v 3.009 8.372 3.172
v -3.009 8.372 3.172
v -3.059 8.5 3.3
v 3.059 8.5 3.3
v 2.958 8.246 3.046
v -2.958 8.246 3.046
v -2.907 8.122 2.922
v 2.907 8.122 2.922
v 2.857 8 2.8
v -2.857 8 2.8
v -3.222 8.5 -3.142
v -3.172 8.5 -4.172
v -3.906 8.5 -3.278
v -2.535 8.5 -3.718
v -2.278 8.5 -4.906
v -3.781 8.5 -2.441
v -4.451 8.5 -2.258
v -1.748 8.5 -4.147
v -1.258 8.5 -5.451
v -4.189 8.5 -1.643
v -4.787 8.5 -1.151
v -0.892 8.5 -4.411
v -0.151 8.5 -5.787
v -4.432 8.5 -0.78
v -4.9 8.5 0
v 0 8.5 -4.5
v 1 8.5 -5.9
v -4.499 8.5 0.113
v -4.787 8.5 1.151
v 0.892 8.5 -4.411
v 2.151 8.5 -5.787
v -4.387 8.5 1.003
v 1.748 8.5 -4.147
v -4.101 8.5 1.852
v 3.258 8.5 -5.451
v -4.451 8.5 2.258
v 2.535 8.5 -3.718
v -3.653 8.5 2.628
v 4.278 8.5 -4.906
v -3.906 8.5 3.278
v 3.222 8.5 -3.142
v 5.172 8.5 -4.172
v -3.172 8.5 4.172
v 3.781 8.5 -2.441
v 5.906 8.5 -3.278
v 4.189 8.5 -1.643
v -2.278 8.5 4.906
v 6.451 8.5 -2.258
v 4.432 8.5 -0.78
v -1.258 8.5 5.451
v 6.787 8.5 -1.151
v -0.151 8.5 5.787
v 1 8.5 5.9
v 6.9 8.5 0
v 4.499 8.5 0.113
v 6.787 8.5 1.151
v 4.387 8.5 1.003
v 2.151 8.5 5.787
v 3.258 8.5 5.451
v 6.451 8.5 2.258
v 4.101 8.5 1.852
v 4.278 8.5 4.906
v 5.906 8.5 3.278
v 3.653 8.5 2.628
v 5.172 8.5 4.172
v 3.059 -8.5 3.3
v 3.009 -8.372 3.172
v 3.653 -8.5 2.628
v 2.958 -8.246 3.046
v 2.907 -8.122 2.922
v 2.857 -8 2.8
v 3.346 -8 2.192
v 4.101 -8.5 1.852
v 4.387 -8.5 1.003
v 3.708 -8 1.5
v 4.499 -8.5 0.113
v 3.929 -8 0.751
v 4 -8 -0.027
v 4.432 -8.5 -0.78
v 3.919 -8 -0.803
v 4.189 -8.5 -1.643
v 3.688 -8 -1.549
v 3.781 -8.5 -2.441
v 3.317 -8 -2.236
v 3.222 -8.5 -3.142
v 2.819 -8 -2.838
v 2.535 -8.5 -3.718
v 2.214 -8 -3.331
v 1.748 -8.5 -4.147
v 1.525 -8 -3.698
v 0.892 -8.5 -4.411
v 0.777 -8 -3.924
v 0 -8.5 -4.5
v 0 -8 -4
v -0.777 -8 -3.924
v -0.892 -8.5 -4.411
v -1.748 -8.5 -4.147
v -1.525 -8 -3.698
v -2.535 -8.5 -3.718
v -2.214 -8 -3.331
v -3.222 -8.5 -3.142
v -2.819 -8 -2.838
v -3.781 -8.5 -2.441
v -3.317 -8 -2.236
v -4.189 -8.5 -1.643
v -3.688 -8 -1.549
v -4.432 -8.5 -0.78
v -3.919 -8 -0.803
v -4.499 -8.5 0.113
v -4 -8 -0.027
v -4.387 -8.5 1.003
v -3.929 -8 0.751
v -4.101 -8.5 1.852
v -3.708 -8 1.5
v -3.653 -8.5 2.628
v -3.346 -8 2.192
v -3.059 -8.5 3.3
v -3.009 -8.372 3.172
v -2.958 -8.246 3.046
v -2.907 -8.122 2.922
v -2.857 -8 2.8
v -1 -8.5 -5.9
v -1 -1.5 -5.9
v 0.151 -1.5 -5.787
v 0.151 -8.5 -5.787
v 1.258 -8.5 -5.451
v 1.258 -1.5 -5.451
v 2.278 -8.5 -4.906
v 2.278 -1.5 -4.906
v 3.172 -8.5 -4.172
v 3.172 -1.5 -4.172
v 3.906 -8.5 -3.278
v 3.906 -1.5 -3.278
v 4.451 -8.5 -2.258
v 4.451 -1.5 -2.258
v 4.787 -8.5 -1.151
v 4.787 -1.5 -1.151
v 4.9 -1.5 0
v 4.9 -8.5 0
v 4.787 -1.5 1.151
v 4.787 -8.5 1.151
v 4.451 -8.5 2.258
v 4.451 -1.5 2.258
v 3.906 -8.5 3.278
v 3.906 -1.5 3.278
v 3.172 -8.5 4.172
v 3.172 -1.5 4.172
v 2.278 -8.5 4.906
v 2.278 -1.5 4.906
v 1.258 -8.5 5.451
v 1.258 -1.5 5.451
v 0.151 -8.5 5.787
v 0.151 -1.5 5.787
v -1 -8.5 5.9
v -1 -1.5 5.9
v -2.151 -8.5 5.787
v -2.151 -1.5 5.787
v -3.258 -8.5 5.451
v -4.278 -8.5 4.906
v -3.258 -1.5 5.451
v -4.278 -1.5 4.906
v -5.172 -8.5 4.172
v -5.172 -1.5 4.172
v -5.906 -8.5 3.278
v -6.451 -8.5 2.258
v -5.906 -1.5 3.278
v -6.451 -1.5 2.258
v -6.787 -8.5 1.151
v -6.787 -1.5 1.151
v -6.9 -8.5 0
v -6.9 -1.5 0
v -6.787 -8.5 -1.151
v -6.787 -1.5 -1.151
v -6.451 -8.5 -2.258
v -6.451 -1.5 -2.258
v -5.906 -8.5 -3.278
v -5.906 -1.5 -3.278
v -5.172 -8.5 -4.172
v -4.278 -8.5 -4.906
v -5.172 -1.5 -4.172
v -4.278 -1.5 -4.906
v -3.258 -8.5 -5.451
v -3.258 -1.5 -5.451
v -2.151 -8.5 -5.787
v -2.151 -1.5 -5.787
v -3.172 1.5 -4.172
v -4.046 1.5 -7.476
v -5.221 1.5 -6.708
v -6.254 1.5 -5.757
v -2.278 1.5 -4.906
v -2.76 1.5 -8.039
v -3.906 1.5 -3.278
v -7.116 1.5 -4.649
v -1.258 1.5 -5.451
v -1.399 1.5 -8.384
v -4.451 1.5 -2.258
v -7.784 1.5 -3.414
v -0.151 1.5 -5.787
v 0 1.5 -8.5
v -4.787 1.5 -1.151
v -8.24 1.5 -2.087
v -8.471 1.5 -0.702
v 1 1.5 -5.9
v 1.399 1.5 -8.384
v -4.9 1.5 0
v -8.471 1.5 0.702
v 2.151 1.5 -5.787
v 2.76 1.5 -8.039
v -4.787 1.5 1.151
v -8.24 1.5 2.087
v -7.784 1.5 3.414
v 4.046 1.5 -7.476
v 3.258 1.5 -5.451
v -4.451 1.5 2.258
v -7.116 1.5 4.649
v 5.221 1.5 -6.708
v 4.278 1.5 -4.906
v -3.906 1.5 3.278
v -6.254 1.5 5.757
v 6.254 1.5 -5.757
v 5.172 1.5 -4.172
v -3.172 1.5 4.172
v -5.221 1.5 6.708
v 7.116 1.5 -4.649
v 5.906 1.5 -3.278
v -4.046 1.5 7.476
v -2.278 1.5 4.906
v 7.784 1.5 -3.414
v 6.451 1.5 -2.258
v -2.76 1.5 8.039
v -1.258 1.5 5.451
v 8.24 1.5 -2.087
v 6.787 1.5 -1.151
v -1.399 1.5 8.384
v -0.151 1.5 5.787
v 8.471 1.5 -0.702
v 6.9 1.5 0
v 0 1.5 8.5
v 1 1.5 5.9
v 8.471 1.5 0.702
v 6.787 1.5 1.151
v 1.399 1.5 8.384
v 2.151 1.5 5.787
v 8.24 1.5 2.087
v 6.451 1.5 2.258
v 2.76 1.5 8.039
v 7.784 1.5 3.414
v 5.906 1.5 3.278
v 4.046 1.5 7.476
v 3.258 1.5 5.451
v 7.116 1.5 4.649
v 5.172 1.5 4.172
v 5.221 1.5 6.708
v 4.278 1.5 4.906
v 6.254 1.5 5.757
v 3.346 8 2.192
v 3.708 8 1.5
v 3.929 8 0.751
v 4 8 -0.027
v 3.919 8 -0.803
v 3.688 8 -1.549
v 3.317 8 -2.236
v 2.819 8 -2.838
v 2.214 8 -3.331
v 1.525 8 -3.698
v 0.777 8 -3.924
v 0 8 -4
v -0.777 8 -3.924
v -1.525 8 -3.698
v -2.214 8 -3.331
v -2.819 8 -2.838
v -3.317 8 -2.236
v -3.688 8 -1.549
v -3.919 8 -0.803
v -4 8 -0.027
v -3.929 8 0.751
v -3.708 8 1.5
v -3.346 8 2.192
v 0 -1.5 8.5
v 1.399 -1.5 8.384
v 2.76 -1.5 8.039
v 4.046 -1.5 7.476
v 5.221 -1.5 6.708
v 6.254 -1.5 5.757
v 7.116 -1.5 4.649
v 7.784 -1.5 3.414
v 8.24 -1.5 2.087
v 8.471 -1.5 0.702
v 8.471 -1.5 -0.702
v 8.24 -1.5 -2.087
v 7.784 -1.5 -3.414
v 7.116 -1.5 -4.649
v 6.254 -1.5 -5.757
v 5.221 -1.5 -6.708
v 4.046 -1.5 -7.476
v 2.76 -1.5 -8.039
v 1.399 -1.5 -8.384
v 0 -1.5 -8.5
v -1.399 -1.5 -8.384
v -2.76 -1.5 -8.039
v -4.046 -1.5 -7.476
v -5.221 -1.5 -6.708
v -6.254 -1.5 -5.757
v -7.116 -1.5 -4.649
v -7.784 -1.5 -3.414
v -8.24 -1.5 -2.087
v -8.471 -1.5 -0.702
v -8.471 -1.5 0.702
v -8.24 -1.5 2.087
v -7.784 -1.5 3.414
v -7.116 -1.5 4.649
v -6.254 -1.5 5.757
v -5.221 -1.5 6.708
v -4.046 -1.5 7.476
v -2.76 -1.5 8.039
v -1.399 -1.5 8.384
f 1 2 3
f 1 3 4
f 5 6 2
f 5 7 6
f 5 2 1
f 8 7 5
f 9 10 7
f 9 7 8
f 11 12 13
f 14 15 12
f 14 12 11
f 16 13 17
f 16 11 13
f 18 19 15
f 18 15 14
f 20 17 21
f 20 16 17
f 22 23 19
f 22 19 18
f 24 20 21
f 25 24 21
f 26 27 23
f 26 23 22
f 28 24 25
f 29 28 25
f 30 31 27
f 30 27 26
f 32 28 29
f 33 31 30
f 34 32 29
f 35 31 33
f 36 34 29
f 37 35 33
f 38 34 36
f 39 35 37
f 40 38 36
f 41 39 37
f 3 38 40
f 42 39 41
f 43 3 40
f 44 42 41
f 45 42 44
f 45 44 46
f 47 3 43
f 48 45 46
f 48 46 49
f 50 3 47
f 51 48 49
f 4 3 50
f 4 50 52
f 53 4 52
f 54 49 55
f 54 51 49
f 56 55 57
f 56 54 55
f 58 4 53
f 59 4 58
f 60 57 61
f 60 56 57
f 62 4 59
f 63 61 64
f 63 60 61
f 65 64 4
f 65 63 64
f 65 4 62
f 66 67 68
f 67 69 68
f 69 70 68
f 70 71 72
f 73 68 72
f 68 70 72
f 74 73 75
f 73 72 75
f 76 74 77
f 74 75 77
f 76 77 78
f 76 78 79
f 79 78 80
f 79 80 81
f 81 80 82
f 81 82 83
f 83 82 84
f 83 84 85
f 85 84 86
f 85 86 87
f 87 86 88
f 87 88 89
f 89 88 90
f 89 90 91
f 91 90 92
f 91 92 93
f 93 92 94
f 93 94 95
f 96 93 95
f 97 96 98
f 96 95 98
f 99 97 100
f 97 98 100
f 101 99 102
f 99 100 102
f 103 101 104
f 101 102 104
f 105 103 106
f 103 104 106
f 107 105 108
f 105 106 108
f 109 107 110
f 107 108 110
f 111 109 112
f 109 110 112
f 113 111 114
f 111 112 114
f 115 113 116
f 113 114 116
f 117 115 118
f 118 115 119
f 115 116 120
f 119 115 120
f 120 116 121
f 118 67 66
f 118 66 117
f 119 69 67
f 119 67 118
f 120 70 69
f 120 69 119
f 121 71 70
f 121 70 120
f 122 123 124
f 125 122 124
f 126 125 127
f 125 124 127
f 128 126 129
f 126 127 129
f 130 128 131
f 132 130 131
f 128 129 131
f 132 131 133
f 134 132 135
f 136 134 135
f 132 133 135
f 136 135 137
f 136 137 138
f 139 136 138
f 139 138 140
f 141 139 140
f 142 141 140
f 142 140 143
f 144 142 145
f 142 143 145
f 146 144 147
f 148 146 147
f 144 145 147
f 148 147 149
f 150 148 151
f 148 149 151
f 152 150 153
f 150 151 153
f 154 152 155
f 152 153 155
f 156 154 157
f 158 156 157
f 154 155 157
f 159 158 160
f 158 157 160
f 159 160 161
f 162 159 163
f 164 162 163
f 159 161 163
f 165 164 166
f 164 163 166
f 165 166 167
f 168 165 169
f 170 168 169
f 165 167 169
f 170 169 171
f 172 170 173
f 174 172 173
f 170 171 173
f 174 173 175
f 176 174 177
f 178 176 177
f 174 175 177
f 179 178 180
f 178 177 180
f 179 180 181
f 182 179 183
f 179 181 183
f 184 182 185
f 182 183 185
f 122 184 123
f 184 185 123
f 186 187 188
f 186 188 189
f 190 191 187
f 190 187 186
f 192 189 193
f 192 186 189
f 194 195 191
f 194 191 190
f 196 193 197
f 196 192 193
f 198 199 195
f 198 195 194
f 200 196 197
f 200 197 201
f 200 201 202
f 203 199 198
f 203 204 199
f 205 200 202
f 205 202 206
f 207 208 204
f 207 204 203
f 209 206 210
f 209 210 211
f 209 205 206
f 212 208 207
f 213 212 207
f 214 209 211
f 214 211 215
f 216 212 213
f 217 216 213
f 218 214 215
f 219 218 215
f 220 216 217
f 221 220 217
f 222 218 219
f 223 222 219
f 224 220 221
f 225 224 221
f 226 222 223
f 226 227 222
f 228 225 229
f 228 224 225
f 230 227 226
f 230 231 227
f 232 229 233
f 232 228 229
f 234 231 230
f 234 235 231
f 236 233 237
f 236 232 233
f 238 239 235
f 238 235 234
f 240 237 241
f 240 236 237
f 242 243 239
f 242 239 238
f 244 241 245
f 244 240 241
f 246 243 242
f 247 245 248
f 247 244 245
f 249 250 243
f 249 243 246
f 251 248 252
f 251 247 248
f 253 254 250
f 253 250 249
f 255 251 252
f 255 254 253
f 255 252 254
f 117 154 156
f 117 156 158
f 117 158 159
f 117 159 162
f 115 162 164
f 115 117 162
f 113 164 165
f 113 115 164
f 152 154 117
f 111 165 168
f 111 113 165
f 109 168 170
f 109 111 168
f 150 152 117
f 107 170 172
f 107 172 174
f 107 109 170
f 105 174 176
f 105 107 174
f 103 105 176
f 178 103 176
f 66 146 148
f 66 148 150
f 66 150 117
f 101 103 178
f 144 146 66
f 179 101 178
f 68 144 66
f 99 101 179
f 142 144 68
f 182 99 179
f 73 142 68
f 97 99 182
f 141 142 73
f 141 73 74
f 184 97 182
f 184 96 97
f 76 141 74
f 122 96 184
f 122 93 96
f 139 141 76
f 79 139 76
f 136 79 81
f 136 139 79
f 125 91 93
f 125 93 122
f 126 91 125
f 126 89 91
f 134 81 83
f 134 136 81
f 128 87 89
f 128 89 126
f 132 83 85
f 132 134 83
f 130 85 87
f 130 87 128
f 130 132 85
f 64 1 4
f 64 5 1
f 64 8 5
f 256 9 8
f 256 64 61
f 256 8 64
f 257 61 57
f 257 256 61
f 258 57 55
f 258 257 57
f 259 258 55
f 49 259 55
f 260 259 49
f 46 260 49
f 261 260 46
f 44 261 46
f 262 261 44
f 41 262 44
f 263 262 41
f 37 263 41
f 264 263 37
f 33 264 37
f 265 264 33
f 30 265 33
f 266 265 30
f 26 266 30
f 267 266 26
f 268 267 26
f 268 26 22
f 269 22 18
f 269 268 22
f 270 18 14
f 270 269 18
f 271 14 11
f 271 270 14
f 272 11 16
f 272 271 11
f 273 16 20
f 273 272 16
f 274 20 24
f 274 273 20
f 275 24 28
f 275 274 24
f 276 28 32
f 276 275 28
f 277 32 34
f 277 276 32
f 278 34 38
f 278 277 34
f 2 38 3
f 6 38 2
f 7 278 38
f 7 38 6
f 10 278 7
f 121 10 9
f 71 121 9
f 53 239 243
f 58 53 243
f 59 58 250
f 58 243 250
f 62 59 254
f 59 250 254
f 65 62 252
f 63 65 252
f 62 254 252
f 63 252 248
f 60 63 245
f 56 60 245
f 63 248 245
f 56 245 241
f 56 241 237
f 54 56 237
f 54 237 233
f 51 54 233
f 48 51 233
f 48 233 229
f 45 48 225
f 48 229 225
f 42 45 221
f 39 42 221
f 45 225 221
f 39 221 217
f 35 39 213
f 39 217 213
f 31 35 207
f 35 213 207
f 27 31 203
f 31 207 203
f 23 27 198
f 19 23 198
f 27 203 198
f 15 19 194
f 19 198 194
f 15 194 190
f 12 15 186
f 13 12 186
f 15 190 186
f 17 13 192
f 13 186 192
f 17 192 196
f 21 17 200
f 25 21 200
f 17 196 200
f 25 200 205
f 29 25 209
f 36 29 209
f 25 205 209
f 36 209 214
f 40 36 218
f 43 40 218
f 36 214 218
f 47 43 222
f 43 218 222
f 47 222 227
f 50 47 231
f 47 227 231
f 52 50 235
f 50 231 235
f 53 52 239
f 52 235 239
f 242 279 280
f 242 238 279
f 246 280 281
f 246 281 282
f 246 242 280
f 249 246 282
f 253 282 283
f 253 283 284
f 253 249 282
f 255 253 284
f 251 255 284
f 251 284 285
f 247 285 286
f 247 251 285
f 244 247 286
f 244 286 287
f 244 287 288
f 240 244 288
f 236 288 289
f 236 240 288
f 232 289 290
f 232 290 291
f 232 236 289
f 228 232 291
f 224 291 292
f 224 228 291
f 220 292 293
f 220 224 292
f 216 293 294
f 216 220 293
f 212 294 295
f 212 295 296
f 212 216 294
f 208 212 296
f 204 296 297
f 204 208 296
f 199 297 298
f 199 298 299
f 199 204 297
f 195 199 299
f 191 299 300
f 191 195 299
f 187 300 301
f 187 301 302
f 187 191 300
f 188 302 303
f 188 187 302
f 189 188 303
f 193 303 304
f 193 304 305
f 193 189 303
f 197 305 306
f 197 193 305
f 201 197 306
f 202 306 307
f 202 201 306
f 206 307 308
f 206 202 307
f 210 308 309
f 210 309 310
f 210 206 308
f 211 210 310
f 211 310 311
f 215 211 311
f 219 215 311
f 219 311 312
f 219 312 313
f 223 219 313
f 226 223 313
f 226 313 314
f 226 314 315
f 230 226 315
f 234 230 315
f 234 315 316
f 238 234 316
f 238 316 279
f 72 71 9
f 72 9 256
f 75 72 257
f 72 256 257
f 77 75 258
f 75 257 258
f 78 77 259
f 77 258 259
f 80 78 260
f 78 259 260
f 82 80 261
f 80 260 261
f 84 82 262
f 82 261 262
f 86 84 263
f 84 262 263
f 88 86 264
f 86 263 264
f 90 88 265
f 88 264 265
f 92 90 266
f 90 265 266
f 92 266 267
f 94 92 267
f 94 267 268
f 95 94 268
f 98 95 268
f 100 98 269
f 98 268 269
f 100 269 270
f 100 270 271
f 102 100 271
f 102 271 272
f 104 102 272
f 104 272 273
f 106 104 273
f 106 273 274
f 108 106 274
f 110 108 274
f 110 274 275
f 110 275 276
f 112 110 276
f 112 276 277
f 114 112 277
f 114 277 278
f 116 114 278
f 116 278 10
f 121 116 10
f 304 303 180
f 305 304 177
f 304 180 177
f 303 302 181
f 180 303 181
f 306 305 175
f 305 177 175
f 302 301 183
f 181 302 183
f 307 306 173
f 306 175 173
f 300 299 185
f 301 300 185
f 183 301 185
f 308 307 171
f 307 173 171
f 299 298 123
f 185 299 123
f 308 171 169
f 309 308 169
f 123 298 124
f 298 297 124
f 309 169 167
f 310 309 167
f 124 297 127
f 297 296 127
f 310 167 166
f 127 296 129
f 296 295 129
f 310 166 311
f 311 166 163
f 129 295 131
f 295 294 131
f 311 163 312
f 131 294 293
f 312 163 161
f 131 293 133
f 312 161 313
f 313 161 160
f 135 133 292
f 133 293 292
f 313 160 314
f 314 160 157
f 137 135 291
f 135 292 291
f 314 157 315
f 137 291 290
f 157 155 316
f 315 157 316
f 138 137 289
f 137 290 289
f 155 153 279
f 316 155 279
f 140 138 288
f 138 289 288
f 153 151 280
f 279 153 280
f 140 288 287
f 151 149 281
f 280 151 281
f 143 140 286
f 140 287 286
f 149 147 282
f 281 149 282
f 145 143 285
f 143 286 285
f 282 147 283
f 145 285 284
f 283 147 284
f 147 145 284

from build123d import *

# Parameters (mm, degrees)
SKIZZE1_R                       = 8.5
AUFSATZ_LINEAR_AUSTRAGEN1_DEPTH = 1.5
SKIZZE2_R                       = 5.9
AUFSATZ_LINEAR_AUSTRAGEN2_DEPTH = 7
SKIZZE3_R                       = 5.9
AUFSATZ_LINEAR_AUSTRAGEN3_DEPTH = 7
SCHNITT_LINEAR_AUSTRAGEN1_DEPTH = 21.820662814
FASE1_SIZE                      = 0.5


with BuildPart() as part:
    # Skizze1 → Aufsatz-Linear austragen1 (new, symmetric)
    with BuildSketch(Plane(origin=(0, 0, 0), x_dir=(1, 0, 0), z_dir=(0, 1, 0))):
        with Locations(Location((0, 0, 0), (0, 0, 270))):
            Circle(SKIZZE1_R)
    extrude(amount=AUFSATZ_LINEAR_AUSTRAGEN1_DEPTH, both=True)

    # Skizze2 → Aufsatz-Linear austragen2 (add)
    with BuildSketch(Plane(origin=(0, 1.5, 0), x_dir=(1, 0, 0), z_dir=(0, 1, 0))):
        with Locations(Location((1, 0, 0), (0, 0, 270))):
            Circle(SKIZZE2_R)
    extrude(amount=AUFSATZ_LINEAR_AUSTRAGEN2_DEPTH)

    # Skizze3 → Aufsatz-Linear austragen3 (add)
    with BuildSketch(Plane.XZ.offset(1.5)):
        with Locations(Location((-1, 0, 0), (0, 0, 270))):
            Circle(SKIZZE3_R)
    extrude(amount=AUFSATZ_LINEAR_AUSTRAGEN3_DEPTH)

    # Skizze4 → Schnitt-Linear austragen1 (cut, through all)
    with BuildSketch(Plane(origin=(0, 8.5, 0), x_dir=(1, 0, 0), z_dir=(0, 1, 0))):
        with BuildLine():
            Line((-2.856571371, -2.8), (2.856571371, -2.8))
            ThreePointArc((2.856571371, -2.8), (0, 4), (-2.856571371, -2.8))
        make_face()
    extrude(amount=-SCHNITT_LINEAR_AUSTRAGEN1_DEPTH, mode=Mode.SUBTRACT)

    # Fase1
    fase1_edges = [part.edges().sort_by_distance(p)[0] for p in [
        (0, -8.5, -4),
        (0, -8.5, 2.8),
        (0, 8.5, -4),
        (0, 8.5, 2.8),
    ]]
    chamfer(fase1_edges, length=FASE1_SIZE)


solid = part.part
